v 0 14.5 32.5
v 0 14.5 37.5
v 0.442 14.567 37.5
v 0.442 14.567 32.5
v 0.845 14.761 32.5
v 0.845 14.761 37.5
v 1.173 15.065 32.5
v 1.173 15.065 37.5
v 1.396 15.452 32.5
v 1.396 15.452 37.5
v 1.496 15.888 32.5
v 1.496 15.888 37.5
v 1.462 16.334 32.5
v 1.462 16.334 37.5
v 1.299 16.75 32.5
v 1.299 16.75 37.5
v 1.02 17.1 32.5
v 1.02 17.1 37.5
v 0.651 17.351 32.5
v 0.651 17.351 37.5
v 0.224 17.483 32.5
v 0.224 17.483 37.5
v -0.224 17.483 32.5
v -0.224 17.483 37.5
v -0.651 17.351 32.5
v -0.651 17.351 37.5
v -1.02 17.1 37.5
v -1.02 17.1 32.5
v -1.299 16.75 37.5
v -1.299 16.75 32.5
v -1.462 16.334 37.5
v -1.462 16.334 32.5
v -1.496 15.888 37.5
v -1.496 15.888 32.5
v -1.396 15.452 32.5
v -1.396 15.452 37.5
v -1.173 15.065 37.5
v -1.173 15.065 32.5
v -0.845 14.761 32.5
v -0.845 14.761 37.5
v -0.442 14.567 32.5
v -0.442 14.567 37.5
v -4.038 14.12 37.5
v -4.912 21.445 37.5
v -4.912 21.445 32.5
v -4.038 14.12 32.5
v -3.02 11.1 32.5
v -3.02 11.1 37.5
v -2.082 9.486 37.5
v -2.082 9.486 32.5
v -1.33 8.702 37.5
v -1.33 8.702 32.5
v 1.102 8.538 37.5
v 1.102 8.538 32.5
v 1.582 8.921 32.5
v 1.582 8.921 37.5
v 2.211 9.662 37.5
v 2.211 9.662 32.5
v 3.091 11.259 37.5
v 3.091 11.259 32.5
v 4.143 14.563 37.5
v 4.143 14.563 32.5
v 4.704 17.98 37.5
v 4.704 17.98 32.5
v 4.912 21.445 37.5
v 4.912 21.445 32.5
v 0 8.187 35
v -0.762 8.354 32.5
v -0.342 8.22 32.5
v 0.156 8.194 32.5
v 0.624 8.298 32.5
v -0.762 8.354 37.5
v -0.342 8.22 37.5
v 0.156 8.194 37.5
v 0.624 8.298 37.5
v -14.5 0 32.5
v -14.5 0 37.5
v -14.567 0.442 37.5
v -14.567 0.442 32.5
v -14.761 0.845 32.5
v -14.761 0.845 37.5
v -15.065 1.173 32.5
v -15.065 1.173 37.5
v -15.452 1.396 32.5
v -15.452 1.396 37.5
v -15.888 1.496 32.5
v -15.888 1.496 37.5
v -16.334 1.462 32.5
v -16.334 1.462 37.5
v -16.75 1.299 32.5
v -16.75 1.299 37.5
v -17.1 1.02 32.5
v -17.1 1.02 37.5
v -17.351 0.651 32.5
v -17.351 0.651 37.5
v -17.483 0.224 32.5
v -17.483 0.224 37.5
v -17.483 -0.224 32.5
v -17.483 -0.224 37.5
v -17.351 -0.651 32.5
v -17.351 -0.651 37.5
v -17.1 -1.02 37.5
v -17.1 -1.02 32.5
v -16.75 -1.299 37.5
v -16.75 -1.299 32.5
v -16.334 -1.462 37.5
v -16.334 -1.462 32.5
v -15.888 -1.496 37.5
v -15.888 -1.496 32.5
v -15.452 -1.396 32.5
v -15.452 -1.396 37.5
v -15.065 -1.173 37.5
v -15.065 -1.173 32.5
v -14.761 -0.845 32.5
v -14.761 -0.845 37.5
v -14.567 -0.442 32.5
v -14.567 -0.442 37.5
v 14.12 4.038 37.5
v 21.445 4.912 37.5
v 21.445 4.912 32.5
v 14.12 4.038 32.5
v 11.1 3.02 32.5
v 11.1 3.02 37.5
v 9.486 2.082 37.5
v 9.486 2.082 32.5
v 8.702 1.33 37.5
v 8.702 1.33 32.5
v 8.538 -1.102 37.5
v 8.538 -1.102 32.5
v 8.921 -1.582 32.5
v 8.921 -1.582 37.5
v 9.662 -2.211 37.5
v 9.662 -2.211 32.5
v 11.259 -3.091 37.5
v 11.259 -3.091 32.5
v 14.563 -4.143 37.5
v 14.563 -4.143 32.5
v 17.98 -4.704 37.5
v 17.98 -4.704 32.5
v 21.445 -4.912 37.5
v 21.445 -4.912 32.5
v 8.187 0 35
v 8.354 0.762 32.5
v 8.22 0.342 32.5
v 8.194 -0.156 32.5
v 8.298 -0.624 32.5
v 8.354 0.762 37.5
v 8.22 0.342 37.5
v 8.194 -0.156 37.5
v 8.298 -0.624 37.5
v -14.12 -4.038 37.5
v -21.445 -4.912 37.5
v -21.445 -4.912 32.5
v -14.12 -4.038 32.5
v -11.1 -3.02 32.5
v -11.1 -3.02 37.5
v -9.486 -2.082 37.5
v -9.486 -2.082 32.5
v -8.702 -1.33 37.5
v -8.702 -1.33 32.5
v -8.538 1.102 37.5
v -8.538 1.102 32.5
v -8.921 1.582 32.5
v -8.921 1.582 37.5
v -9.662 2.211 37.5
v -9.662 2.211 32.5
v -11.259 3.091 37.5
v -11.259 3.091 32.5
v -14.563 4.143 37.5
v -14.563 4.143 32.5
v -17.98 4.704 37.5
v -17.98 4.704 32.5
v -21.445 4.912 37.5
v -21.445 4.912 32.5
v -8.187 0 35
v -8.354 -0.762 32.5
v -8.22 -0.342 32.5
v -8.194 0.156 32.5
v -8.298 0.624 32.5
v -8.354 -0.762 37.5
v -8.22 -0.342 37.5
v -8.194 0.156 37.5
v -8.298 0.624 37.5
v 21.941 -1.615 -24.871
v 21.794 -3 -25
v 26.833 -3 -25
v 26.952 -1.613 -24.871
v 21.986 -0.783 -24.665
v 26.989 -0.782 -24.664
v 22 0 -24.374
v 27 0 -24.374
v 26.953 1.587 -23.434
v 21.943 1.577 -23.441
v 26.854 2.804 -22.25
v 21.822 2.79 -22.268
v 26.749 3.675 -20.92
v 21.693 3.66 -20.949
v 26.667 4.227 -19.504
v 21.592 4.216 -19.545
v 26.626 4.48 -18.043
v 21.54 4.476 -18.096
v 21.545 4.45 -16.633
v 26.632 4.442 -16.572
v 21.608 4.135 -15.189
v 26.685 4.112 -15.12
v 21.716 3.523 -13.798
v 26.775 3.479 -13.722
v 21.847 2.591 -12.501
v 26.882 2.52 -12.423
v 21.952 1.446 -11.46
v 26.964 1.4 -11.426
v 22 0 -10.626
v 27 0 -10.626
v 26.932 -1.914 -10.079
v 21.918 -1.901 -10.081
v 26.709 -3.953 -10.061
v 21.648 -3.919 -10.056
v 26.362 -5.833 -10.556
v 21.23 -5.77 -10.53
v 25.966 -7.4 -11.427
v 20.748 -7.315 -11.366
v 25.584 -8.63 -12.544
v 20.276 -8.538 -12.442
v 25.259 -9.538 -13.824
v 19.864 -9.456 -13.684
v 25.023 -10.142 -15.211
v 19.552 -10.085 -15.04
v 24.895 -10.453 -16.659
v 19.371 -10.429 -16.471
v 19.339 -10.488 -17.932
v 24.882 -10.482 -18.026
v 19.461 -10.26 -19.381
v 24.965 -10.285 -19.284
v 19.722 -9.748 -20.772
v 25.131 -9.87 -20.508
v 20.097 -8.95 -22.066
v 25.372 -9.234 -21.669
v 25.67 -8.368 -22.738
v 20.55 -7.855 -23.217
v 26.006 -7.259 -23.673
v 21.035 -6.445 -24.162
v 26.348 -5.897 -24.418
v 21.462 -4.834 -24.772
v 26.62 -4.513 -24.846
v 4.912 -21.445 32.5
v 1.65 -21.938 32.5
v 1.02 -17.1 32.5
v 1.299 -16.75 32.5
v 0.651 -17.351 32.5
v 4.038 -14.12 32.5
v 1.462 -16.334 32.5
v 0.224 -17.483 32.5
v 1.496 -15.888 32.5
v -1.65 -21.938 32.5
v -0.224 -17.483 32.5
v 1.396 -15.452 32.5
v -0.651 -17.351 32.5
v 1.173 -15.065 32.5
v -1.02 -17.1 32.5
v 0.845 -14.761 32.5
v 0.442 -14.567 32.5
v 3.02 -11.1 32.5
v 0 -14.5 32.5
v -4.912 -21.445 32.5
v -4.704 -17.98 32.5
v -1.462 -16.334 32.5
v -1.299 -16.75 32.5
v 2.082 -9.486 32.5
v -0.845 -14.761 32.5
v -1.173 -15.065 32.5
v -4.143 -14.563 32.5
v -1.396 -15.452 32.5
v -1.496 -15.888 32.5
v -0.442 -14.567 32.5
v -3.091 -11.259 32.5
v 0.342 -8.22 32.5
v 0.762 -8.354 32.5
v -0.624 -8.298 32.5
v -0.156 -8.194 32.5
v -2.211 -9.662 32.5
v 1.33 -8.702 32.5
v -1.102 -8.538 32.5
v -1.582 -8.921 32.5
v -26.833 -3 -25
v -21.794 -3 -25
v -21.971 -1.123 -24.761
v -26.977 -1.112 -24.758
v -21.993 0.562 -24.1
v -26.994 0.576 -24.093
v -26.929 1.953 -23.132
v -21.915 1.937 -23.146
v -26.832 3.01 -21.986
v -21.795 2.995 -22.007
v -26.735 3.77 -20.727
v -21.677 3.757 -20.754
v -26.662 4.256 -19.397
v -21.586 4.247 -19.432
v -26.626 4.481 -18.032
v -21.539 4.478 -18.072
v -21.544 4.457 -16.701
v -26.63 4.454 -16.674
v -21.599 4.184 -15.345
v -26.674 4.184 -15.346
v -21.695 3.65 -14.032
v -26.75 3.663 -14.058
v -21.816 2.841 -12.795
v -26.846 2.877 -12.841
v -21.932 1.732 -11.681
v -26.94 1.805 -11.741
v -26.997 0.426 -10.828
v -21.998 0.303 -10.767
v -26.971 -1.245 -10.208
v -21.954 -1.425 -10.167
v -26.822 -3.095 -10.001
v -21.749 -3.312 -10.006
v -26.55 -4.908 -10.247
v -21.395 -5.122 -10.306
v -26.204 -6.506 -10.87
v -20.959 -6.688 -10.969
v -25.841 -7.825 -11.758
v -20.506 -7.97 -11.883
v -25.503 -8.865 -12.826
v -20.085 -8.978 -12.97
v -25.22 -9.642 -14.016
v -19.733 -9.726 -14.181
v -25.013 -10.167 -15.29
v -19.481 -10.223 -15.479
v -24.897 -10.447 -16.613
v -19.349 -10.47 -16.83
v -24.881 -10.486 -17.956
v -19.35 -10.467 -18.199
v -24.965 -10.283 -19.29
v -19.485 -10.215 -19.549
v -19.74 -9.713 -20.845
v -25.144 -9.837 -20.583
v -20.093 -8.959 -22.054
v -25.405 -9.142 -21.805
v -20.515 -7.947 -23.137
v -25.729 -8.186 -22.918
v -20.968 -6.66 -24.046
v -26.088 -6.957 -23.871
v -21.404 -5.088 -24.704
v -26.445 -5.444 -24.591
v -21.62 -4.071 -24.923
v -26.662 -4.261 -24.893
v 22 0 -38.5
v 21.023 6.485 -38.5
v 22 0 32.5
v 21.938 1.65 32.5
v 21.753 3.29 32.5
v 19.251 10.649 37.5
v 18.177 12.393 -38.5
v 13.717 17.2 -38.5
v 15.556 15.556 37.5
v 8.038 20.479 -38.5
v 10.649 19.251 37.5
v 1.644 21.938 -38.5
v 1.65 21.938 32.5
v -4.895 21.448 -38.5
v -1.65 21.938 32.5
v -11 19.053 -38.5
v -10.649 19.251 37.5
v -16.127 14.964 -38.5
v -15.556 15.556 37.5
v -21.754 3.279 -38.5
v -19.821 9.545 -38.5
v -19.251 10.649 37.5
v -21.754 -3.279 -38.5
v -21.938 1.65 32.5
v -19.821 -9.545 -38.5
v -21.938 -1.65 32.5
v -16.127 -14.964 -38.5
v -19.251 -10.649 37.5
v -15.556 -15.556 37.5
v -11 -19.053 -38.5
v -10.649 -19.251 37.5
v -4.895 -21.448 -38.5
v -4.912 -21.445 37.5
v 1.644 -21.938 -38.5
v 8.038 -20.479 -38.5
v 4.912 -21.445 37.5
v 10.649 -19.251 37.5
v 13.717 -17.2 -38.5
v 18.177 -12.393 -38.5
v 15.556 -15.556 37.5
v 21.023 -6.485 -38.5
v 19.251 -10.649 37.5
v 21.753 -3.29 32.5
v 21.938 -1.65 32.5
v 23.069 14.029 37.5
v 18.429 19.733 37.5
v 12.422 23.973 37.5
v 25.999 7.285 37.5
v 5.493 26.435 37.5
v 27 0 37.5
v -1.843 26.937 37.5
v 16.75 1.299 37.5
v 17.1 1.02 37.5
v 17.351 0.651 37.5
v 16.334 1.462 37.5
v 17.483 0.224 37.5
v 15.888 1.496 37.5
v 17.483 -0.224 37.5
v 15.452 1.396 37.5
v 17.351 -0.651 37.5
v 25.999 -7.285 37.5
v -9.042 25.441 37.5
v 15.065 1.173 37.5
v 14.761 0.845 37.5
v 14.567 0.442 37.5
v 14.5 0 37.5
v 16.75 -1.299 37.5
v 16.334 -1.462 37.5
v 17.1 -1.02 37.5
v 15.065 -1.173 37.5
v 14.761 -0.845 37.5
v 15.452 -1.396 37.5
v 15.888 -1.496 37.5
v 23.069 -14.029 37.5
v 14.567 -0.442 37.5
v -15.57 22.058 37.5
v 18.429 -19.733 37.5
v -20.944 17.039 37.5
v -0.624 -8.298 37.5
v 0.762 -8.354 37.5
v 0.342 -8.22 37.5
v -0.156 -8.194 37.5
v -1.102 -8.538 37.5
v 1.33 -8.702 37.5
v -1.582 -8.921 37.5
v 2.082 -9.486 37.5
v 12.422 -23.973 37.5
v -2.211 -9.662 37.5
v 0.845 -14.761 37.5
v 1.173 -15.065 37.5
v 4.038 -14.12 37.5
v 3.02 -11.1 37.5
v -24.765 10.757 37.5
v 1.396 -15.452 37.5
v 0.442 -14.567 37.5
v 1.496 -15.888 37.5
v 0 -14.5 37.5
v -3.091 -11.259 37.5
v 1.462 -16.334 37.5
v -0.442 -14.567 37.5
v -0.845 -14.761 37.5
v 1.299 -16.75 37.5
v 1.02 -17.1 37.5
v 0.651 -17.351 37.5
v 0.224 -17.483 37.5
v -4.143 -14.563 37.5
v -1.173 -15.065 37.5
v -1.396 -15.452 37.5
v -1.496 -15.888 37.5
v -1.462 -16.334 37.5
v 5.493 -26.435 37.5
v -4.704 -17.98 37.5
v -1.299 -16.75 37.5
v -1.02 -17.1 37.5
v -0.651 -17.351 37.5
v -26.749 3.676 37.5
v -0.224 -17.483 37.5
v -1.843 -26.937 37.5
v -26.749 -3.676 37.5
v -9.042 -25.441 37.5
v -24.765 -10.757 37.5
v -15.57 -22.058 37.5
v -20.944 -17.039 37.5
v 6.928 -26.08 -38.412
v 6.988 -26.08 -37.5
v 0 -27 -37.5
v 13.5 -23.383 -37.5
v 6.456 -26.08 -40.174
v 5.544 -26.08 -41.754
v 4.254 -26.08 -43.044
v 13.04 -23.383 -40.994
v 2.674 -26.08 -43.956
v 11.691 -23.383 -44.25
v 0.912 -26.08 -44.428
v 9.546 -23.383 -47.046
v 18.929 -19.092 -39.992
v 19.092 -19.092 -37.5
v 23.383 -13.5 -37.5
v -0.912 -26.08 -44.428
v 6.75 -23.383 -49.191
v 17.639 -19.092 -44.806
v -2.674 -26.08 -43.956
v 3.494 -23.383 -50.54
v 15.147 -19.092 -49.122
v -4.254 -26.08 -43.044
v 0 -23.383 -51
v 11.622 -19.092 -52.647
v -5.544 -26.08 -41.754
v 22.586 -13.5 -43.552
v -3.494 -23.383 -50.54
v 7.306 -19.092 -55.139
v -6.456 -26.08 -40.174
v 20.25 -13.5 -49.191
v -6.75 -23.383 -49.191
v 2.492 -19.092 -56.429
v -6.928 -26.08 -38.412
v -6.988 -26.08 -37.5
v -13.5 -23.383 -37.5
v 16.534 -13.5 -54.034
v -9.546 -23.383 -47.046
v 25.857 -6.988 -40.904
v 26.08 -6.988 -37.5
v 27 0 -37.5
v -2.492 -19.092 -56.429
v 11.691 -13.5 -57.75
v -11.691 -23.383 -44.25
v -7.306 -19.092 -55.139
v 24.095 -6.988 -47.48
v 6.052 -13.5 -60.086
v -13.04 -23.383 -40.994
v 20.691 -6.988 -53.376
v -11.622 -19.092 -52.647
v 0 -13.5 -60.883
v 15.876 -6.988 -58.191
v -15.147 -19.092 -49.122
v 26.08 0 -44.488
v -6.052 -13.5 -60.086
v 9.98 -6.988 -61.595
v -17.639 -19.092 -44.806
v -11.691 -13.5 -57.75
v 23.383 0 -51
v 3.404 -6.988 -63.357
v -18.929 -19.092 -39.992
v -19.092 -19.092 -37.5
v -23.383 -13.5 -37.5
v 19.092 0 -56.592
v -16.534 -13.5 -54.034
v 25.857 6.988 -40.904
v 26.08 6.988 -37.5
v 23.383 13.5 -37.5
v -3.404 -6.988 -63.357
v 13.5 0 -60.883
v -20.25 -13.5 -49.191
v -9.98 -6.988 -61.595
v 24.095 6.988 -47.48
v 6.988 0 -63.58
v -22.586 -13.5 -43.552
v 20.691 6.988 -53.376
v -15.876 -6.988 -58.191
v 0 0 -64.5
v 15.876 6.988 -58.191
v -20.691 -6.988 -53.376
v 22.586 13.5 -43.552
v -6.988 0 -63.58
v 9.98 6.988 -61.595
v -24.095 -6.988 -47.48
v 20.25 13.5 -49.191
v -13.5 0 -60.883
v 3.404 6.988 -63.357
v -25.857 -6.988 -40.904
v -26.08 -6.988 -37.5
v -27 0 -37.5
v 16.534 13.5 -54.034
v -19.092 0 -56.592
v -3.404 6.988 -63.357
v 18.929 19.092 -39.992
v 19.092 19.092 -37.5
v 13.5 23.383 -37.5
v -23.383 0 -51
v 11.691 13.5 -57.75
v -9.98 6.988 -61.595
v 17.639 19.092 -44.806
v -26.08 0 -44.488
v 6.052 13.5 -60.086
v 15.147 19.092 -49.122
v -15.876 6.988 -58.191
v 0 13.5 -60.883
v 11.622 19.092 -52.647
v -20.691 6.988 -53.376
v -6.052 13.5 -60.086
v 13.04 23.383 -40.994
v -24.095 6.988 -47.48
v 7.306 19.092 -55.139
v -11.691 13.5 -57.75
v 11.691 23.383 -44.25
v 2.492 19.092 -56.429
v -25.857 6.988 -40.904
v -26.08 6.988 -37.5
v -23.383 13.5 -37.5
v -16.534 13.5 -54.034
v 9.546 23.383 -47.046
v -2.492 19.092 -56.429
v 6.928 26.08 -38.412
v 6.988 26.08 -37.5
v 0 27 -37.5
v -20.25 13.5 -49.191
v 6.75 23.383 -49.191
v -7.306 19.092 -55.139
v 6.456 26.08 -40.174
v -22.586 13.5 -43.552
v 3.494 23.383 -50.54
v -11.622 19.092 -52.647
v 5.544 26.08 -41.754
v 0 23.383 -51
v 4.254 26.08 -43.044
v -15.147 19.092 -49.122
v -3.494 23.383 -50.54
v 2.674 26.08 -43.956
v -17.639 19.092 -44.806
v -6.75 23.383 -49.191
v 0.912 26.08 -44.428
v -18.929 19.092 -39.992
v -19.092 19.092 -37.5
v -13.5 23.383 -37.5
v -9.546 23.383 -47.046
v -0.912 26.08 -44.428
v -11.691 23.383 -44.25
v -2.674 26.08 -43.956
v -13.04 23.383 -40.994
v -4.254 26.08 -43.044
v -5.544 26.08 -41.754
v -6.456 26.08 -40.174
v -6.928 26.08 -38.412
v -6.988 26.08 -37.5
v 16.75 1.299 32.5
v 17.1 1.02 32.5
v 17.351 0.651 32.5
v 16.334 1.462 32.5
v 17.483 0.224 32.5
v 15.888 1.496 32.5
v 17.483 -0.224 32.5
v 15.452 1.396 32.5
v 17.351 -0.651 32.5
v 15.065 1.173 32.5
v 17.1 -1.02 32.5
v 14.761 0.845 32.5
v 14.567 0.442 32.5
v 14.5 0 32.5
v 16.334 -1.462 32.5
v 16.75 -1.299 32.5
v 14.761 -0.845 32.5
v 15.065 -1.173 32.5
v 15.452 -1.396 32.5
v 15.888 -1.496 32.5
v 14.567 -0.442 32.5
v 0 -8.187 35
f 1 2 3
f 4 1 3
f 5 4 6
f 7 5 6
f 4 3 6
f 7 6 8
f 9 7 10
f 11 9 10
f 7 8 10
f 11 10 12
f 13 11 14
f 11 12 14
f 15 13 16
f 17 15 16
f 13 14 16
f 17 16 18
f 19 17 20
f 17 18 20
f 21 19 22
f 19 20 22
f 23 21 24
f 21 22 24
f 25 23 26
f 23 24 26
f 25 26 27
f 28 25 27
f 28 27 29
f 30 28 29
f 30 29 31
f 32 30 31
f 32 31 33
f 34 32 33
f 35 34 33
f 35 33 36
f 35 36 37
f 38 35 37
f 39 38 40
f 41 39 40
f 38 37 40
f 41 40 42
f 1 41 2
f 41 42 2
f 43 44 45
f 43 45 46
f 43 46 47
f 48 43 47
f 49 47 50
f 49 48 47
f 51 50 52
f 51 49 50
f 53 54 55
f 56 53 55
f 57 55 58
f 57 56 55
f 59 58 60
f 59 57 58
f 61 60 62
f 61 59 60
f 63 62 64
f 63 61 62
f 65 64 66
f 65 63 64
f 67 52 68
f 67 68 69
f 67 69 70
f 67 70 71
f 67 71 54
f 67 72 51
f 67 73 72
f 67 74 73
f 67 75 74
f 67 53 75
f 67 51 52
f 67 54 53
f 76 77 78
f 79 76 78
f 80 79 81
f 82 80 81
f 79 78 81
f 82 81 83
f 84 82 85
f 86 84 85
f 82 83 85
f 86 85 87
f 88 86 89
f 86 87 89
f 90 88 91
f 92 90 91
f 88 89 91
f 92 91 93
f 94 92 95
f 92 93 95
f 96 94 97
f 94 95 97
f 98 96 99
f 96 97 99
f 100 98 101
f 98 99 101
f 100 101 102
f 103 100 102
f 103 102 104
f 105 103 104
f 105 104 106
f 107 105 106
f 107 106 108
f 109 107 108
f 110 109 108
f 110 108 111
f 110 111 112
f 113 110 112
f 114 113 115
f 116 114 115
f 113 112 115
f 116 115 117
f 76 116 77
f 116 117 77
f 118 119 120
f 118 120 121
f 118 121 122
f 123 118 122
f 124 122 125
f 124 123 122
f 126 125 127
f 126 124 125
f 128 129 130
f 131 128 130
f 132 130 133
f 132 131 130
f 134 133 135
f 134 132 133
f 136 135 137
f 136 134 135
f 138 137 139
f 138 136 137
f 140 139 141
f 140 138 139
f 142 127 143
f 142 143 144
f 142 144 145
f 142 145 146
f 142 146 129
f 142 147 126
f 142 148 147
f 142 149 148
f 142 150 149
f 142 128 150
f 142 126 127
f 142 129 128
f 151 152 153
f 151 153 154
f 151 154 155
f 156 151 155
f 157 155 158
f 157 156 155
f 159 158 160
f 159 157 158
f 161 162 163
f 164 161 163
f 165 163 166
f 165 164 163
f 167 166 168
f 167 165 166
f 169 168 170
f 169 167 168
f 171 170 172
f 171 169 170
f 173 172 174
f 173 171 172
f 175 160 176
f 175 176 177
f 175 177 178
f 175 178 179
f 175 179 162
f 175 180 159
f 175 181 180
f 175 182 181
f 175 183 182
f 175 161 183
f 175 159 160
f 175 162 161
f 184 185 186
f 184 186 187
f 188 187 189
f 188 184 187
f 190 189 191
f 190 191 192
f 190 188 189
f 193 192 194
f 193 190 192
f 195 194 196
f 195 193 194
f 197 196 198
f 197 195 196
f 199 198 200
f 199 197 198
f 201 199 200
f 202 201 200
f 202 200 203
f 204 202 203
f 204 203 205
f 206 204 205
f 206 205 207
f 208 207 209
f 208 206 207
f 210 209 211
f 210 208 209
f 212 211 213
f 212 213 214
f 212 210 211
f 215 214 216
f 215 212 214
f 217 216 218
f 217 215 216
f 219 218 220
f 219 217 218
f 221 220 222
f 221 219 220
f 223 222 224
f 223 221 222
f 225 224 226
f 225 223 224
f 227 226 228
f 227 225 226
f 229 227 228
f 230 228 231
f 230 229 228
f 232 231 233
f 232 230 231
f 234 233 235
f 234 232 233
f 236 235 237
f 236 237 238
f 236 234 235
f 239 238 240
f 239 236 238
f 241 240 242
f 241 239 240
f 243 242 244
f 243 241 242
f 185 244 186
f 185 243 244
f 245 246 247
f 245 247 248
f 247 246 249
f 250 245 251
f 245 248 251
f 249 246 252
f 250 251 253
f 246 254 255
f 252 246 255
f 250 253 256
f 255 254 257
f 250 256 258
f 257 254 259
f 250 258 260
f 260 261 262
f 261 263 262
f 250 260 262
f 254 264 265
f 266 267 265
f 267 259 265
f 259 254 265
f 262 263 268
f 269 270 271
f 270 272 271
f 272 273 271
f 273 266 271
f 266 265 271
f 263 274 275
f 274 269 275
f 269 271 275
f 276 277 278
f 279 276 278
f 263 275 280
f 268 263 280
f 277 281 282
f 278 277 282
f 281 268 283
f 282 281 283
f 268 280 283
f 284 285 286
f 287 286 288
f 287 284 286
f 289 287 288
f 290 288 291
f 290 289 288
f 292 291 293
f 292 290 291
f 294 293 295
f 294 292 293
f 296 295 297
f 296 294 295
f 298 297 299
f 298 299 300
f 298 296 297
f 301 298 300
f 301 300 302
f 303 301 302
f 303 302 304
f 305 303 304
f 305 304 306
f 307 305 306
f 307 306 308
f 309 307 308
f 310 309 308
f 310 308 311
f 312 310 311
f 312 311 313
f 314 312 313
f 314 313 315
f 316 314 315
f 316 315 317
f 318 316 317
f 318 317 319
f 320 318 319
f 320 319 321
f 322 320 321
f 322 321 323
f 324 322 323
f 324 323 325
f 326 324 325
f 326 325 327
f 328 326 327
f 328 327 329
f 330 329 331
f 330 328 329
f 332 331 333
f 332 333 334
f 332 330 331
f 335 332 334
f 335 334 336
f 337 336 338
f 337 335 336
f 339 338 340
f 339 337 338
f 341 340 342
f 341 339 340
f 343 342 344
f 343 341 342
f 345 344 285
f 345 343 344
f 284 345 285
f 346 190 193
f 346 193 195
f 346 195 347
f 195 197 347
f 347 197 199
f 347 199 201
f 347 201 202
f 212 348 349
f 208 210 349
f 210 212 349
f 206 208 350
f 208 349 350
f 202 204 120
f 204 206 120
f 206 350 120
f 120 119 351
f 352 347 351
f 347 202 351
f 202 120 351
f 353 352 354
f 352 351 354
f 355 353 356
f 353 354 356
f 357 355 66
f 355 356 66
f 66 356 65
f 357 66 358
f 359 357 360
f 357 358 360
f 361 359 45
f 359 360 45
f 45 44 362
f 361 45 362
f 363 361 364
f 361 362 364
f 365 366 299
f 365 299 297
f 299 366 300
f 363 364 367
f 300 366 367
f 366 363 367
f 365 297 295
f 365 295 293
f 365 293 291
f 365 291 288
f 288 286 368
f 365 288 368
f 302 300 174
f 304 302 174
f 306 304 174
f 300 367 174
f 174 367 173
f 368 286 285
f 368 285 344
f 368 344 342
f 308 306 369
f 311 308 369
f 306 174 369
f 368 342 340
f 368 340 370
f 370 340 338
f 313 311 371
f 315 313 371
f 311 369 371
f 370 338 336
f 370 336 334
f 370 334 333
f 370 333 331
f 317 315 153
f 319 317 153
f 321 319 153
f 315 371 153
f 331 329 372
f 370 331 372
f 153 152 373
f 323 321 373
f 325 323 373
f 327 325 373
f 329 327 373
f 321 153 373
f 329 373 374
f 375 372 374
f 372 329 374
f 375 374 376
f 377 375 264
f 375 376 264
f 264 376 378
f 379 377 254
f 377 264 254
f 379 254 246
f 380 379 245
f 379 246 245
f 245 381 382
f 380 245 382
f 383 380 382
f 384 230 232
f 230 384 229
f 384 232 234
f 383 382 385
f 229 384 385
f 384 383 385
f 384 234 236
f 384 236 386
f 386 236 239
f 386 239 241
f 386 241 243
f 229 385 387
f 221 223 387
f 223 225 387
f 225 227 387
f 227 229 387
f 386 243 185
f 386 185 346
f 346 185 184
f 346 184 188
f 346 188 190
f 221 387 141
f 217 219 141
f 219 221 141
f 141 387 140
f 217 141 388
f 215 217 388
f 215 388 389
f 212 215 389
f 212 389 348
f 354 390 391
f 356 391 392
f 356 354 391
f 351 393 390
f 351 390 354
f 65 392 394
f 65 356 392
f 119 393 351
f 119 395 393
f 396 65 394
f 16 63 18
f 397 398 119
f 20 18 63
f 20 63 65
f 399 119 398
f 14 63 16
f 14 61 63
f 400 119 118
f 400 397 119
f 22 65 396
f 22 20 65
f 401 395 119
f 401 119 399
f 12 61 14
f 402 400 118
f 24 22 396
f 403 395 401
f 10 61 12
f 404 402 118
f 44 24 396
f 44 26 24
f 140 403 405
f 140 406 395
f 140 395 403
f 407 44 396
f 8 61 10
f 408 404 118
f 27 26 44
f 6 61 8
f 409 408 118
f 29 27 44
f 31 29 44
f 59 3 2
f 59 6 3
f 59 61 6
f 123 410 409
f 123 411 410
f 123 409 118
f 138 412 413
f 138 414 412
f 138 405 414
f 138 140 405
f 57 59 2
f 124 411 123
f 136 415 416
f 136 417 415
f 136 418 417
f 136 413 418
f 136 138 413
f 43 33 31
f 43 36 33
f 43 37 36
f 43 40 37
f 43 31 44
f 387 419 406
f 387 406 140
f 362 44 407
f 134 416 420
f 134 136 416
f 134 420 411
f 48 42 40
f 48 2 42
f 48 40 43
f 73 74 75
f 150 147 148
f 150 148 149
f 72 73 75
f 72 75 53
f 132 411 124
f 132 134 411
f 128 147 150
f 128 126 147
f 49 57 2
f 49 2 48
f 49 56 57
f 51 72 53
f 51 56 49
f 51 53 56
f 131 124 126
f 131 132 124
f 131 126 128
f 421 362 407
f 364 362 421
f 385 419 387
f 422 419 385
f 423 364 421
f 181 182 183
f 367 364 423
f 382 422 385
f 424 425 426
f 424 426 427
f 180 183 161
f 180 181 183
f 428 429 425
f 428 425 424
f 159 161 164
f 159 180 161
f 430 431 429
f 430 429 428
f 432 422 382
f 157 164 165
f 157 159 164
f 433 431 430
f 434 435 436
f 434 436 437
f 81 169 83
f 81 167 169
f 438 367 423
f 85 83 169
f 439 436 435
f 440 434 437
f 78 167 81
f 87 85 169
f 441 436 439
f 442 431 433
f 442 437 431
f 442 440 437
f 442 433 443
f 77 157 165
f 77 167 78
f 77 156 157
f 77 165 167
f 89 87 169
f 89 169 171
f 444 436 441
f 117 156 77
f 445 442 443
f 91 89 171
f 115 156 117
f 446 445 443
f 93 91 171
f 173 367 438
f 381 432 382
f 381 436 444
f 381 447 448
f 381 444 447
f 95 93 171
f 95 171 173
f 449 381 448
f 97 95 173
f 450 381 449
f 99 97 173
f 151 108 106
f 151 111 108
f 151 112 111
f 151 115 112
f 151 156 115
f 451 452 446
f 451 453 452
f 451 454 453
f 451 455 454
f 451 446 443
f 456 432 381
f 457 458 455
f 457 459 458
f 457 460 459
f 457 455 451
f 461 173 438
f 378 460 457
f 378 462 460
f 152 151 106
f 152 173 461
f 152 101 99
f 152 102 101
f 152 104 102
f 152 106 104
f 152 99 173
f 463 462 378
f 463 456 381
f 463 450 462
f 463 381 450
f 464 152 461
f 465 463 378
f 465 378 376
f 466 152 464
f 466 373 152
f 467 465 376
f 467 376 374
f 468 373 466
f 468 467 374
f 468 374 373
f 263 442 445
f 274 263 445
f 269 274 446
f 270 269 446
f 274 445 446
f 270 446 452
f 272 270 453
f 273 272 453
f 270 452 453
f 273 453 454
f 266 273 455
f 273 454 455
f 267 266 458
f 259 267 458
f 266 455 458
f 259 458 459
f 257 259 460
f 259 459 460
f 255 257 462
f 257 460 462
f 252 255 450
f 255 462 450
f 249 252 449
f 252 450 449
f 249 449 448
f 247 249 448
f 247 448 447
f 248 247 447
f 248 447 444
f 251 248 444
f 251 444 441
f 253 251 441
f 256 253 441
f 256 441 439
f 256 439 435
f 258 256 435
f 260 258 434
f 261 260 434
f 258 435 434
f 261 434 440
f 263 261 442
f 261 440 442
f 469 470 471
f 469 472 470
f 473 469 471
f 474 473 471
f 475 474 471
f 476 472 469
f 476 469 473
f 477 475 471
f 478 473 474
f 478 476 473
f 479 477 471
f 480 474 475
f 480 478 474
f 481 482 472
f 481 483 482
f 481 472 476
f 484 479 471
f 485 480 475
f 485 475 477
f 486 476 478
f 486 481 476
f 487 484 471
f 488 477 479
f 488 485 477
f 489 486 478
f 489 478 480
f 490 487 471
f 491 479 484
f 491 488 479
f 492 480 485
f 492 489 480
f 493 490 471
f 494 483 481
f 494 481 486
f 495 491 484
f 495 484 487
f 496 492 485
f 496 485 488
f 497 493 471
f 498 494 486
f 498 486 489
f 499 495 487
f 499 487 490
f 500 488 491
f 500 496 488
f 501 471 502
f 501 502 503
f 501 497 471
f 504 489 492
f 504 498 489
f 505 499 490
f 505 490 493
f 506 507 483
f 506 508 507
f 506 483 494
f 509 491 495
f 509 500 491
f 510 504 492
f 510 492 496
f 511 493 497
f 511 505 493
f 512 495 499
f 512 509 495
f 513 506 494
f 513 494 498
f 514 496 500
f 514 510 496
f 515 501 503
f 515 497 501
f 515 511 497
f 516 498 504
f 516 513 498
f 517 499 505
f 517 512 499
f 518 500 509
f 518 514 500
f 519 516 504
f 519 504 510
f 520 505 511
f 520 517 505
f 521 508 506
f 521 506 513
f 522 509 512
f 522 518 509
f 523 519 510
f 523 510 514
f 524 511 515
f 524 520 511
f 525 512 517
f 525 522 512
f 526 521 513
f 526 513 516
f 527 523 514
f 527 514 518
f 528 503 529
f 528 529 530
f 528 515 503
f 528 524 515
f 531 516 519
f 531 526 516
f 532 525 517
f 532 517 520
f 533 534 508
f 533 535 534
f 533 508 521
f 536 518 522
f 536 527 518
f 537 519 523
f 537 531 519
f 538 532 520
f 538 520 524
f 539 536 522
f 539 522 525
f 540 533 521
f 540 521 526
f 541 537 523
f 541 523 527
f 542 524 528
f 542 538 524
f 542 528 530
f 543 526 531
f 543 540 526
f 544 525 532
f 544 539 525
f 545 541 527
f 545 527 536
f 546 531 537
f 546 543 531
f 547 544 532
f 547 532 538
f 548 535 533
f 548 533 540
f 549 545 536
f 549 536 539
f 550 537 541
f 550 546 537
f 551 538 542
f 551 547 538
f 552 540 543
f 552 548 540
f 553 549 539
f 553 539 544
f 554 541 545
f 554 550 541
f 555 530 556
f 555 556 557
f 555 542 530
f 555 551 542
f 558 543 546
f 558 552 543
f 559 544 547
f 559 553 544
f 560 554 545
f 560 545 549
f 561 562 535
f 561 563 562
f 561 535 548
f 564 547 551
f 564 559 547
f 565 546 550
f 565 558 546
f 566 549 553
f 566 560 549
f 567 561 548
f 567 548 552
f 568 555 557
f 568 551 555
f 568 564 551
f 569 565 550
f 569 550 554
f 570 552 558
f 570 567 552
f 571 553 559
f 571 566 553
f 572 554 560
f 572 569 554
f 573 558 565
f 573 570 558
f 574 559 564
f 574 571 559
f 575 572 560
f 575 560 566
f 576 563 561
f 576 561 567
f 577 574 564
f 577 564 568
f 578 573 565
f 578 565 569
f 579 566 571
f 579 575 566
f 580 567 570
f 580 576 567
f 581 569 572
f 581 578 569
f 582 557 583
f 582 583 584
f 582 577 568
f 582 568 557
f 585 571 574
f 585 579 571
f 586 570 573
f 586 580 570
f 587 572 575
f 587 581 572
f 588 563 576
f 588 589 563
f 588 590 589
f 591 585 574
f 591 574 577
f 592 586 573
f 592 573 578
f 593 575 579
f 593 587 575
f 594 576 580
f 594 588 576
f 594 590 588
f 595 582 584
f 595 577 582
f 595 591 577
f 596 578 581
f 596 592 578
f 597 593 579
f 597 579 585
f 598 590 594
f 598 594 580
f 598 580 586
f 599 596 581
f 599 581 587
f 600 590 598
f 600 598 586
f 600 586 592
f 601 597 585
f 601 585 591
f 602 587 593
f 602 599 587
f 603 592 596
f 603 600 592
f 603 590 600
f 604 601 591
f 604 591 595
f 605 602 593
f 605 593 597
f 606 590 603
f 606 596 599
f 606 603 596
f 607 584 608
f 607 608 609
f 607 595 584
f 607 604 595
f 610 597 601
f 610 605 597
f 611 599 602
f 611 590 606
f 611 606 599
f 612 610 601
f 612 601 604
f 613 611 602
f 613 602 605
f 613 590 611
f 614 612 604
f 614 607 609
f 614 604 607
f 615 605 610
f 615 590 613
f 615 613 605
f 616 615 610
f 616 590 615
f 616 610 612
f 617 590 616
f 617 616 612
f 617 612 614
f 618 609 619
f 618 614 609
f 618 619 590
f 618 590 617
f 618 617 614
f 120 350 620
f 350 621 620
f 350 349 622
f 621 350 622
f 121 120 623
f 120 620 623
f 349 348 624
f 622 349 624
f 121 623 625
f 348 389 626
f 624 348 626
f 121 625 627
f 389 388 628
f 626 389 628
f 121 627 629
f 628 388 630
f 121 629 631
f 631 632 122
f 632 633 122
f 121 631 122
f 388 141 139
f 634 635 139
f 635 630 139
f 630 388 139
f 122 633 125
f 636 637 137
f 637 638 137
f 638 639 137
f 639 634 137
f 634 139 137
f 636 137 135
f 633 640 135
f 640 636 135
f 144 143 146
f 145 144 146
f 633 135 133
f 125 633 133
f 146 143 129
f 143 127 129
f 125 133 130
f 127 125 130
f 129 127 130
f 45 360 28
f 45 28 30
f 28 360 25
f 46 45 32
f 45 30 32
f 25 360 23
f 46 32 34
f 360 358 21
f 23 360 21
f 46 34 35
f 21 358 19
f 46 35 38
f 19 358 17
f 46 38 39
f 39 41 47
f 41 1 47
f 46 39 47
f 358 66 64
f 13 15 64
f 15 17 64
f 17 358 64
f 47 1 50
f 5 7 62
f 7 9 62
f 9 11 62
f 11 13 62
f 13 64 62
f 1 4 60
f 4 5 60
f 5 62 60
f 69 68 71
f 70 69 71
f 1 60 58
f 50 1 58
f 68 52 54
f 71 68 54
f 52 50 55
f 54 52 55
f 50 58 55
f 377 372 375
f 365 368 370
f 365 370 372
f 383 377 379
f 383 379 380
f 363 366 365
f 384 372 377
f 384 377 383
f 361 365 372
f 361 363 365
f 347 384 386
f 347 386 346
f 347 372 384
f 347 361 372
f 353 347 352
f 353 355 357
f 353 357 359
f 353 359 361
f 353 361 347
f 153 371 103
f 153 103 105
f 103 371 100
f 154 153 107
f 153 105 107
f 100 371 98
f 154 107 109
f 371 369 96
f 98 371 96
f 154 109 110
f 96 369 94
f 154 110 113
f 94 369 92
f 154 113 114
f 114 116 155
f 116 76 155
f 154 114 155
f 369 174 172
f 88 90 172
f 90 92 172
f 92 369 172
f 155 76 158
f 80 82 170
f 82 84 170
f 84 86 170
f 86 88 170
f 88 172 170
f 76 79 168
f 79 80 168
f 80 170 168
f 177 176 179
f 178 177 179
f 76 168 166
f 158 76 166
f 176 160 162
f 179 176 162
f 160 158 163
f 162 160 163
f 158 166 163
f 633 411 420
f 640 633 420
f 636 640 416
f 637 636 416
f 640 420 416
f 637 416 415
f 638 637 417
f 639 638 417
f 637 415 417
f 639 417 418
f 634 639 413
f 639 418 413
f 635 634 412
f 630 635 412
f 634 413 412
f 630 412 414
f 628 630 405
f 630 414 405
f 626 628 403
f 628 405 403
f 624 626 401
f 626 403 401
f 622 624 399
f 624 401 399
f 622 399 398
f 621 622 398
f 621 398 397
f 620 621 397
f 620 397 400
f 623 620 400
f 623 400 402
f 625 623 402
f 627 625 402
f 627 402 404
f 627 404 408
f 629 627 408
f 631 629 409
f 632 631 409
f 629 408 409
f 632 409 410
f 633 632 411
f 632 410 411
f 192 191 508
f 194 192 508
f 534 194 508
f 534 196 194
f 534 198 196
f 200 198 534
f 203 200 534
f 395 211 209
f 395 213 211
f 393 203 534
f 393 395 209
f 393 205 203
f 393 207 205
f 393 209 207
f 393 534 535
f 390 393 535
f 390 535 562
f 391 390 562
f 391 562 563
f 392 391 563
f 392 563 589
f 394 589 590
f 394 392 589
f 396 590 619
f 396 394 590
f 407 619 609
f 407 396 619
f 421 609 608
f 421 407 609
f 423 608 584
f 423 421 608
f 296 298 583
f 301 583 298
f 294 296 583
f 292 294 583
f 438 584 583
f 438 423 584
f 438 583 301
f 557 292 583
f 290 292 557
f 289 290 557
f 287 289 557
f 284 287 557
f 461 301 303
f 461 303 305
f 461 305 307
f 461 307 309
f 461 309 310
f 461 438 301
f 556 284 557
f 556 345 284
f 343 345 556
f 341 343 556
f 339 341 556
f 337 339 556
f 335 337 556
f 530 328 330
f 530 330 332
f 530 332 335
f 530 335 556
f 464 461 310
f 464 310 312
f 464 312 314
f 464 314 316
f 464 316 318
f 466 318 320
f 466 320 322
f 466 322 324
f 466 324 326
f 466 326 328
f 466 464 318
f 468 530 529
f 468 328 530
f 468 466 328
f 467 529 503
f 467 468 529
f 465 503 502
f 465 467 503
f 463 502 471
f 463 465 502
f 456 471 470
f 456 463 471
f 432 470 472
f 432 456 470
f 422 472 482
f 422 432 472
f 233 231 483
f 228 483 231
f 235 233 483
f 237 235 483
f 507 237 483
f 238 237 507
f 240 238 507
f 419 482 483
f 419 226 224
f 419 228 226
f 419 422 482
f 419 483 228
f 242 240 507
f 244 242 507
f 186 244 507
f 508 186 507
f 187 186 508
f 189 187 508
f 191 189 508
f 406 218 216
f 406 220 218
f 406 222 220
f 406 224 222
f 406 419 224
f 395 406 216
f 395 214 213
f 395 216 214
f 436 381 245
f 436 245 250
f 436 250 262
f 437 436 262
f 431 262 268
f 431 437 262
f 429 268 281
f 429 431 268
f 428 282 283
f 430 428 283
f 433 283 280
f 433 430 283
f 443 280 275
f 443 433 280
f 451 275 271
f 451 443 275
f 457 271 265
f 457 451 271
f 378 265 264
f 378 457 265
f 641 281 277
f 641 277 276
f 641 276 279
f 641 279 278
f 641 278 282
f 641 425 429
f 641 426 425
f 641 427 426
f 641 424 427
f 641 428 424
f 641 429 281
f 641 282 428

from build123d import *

# Parameters (mm, degrees)
SKETCH1_R               = 27
BOSS_EXTRUDE1_DEPTH     = 37.5
CUT_EXTRUDE2_DEPTH      = 54.518688325
CUT_EXTRUDE2_DEPTH_BACK = 54.518688325
SKETCH3_R               = 7.5
REVOLVE1_ANGLE          = 180
SKETCH2_R               = 22
CUT_EXTRUDE3_DEPTH      = 76
SKETCH13_R              = 1.5
BOSS_EXTRUDE3_DEPTH     = 5
CIRPATTERN1_COUNT       = 4


with BuildPart() as part:
    # Sketch1 → Boss-Extrude1 (new, symmetric)
    with BuildSketch(Plane.XY):
        Circle(SKETCH1_R)
    extrude(amount=BOSS_EXTRUDE1_DEPTH, both=True)

    # Sketch3 → Cut-Extrude2 (cut, two sides: drawn at the far end of the back side and taken through both)
    with BuildSketch(Plane(origin=(0, 0, 0), x_dir=(0, 0, -1), z_dir=(1, 0, 0)).offset(-CUT_EXTRUDE2_DEPTH_BACK)):
        with Locations((17.5, -3)):
            Circle(SKETCH3_R)
    extrude(amount=CUT_EXTRUDE2_DEPTH + CUT_EXTRUDE2_DEPTH_BACK, mode=Mode.SUBTRACT)

    # Sketch7 → Revolve1 (revolve)
    with BuildSketch(Plane(origin=(0, 0, -37.5), x_dir=(-1, 0, 0), z_dir=(0, 0, -1))):
        with BuildLine():
            Line((0, 27), (0, -27))
            ThreePointArc((0, -27), (-27, 0), (0, 27))
        make_face()
    revolve(axis=Axis((0, 27, -37.5), (0, 1, 0)), revolution_arc=REVOLVE1_ANGLE)

    # Sketch2 → Cut-Extrude3 (cut)
    with BuildSketch(Plane.XY.offset(37.5)):
        Circle(SKETCH2_R)
    extrude(amount=-CUT_EXTRUDE3_DEPTH, mode=Mode.SUBTRACT)

    # Sketch13 → Boss-Extrude3 (add)
    with BuildSketch(Plane.XY.offset(37.5)):
        with BuildLine():
            ThreePointArc((-21.444531116, 4.912441881), (-22, 0), (-21.444531116, -4.912441881))
            add(Edge.make_bspline(
                [(-21.444531116, -4.912441881), (-8.186572838, -4.722538036), (-8.186572838, 0), (-8.186572838, 4.722538036), (-21.444531116, 4.912441881)],
                knots=[1.611019415, 1.611019415, 1.611019415, 3.141592654, 3.141592654, 4.672165893, 4.672165893, 4.672165893], degree=2, weights=[1, 0.721183833, 1, 0.721183833, 1]))
        make_face()
        with Locations((-16, 0)):
            Circle(SKETCH13_R, mode=Mode.SUBTRACT)
    boss_extrude3 = extrude(amount=-BOSS_EXTRUDE3_DEPTH)

    # CirPattern1: Boss-Extrude3 ×4 about axis
    cirpattern1_axis = Axis((0, 0, 37.5), (0, 0, -1))
    for i in range(1, CIRPATTERN1_COUNT):
        add(boss_extrude3.rotate(cirpattern1_axis, i * 360 / CIRPATTERN1_COUNT))


solid = part.part
